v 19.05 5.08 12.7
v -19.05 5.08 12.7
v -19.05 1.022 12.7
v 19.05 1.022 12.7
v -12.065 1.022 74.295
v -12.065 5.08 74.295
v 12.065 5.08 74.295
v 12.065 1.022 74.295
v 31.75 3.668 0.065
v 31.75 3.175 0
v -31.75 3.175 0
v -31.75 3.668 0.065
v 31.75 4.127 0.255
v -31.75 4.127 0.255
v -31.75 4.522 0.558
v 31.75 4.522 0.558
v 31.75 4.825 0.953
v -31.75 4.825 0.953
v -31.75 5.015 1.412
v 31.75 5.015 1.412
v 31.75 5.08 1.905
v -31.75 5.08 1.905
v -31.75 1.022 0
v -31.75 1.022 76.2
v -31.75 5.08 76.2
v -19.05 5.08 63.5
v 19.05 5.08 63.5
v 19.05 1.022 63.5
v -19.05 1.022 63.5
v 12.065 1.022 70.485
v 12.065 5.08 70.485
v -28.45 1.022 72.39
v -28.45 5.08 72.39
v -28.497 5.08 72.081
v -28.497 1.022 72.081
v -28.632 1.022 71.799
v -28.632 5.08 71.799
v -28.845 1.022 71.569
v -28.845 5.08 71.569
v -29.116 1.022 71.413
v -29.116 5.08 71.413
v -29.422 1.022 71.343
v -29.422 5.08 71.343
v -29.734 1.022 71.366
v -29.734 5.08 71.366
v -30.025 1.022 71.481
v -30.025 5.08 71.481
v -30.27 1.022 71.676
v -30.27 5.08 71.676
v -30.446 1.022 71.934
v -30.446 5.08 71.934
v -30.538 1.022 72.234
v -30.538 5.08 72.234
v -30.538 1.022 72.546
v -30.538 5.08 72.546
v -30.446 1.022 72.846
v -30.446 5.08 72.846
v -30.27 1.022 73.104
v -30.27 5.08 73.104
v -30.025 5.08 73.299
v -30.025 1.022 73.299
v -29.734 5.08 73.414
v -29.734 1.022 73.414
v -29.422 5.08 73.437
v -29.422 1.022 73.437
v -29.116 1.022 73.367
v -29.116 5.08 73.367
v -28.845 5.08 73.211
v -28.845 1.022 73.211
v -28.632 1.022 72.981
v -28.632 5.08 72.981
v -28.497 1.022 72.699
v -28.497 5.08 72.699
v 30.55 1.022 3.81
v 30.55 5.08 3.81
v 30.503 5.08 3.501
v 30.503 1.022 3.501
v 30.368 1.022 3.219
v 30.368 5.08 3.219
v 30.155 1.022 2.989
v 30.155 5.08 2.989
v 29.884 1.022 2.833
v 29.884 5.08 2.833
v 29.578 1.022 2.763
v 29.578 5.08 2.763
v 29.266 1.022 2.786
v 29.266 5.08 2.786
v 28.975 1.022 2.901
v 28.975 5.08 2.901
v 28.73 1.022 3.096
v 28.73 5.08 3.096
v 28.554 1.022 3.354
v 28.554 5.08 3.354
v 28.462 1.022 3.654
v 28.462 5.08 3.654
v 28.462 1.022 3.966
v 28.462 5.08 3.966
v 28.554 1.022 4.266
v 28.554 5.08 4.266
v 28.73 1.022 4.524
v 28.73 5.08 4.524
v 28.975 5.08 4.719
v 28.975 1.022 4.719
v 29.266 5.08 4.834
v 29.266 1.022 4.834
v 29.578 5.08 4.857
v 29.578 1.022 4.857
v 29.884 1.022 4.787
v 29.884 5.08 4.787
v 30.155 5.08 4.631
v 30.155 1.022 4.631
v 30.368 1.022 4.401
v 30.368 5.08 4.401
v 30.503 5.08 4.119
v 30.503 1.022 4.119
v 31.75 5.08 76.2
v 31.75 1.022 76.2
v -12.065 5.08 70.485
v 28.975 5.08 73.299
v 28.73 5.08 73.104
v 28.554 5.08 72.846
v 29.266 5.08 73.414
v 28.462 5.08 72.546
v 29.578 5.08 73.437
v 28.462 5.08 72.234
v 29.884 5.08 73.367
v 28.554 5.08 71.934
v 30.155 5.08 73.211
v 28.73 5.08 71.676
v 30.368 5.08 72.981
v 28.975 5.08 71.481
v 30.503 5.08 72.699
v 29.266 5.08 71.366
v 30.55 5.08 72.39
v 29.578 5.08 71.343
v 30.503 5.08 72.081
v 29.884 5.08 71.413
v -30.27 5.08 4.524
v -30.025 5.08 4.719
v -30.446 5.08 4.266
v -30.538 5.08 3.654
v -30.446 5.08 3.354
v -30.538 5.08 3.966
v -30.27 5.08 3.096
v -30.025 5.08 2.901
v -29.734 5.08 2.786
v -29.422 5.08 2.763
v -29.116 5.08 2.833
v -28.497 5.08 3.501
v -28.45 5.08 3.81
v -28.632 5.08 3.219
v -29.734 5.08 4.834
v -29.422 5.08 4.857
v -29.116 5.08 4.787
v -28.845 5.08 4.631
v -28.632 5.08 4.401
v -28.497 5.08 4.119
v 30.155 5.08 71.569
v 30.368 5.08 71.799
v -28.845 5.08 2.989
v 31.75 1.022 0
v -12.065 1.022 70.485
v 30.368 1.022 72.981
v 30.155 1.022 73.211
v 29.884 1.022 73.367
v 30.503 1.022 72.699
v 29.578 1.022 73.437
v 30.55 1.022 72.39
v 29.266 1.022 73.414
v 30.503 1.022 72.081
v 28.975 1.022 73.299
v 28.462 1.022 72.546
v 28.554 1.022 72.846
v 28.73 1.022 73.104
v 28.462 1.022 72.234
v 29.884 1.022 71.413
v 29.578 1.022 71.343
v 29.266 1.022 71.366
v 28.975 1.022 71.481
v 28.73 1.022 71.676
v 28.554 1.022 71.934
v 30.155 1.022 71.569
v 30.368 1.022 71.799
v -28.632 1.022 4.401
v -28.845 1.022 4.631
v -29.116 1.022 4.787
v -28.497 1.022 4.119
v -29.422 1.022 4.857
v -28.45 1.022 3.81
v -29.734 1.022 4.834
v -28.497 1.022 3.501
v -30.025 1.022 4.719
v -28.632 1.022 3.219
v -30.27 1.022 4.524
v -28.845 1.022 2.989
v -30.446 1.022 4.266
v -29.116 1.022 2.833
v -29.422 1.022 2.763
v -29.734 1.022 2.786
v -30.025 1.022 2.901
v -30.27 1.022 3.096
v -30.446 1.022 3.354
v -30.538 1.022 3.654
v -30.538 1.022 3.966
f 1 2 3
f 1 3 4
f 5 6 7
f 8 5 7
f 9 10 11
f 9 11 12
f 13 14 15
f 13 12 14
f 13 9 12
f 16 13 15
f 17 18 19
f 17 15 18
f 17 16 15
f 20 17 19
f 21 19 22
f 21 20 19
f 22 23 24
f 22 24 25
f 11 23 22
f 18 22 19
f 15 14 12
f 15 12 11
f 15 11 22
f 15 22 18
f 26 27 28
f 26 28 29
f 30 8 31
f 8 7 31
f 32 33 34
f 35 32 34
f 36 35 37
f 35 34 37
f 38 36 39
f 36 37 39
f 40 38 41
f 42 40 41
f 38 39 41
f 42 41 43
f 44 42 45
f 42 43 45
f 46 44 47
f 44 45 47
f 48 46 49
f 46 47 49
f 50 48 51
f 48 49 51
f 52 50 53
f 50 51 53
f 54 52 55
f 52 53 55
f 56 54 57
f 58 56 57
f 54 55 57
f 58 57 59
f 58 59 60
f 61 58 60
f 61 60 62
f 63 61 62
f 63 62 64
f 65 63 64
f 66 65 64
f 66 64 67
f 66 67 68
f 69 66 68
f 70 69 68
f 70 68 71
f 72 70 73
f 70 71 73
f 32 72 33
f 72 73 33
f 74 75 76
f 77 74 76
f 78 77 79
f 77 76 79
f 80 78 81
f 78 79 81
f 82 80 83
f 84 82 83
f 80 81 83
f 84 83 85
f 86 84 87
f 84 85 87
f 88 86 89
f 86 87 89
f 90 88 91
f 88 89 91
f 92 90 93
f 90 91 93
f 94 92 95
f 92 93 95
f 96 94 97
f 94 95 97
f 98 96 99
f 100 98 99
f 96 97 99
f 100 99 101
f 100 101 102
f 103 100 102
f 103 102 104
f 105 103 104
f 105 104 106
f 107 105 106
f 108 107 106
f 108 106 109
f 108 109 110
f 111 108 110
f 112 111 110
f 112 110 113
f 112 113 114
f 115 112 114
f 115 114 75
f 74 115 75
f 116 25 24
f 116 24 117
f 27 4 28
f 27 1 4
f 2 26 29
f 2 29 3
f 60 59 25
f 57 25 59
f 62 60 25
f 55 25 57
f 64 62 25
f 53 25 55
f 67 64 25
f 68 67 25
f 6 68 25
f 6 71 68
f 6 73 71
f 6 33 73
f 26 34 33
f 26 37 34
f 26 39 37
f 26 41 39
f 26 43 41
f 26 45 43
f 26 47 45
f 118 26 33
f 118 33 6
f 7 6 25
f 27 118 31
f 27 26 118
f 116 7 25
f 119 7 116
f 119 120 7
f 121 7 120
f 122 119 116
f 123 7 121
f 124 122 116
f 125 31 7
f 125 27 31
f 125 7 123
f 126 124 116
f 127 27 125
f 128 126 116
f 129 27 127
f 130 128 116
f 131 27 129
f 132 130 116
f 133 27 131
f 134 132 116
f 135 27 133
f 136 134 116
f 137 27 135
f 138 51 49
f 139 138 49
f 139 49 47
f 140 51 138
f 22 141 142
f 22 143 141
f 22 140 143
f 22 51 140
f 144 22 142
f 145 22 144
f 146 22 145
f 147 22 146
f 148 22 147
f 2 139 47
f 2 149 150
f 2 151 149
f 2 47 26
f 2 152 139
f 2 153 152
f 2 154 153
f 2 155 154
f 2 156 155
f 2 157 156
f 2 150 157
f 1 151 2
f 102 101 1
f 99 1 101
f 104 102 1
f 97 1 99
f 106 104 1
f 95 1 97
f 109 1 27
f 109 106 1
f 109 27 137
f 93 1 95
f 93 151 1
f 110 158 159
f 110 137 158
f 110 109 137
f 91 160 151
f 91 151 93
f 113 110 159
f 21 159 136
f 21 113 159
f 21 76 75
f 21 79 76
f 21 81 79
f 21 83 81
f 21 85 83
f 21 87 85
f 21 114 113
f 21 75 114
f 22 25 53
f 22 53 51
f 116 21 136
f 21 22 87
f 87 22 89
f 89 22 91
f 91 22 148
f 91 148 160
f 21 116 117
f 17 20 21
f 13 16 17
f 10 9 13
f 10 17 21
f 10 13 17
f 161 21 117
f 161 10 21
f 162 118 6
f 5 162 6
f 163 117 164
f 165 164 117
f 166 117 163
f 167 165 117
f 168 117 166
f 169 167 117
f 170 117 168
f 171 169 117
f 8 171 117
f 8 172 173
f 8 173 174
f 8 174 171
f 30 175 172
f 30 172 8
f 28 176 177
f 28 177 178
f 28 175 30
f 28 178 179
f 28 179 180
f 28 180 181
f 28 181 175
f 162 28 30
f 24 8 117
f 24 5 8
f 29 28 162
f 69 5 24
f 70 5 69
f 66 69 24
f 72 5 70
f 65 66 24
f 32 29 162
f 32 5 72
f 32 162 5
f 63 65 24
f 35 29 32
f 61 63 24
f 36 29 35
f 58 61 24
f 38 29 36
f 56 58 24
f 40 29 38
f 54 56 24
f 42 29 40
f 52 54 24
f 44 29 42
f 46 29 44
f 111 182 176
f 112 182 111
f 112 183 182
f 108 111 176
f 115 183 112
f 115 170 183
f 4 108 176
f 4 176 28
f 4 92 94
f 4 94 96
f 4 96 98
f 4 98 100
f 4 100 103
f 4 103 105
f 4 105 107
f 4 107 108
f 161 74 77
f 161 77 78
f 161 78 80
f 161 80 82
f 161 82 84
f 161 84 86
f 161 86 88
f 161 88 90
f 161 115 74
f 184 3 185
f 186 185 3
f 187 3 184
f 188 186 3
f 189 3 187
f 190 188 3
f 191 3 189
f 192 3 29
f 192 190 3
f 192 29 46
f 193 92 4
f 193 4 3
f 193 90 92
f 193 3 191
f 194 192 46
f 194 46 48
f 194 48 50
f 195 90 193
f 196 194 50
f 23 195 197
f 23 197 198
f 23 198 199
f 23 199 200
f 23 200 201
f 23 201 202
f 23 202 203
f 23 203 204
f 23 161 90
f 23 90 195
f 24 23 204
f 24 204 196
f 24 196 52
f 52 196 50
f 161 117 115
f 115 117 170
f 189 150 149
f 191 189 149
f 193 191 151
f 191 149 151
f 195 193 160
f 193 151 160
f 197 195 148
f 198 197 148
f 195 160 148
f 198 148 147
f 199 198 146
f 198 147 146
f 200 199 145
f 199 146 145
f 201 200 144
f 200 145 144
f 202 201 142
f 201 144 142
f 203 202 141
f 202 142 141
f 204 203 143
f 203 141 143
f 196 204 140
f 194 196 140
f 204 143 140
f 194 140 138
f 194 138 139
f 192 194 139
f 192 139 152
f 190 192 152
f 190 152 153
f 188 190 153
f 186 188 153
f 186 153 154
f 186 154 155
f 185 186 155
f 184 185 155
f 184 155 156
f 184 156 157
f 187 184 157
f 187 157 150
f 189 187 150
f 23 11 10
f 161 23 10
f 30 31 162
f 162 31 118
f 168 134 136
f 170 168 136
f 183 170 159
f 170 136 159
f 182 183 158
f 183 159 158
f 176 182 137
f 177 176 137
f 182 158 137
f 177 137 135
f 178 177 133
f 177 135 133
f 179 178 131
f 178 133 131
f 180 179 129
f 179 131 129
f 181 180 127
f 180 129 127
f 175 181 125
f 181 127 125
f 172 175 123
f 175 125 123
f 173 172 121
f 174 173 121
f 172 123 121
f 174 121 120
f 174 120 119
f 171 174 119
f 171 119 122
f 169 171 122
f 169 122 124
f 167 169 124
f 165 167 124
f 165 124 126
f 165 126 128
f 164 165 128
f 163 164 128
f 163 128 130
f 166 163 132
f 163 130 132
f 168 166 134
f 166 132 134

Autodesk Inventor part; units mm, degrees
ref_plane "YZ Plane" through (0, 0, 0) normal (1, 0, 0) x (0, 1, 0)
ref_plane "XZ Plane" through (0, 0, 0) normal (0, 1, 0) x (-1, 0, 0)
ref_plane "XY Plane" through (0, 0, 0) normal (0, 0, 1) x (1, 0, 0)
sketch "Sketch1" plane through (0, 0, 0) normal (0, 0, 1) x (1, 0, 0)
  line L0 (-31.75, 5.08) -> (31.75, 5.08)
  line L1 (31.75, 5.08) -> (31.75, -5.08)
  line L2 (31.75, -5.08) -> (-31.75, -5.08)
  line L3 (-31.75, -5.08) -> (-31.75, 5.08)
  point P0 (0, 0)
  dimension "d0" = 63.5
  dimension "d3" = 31.75
  dimension "d4" = 10.16
  dimension "d17" = 5.08
extrude "Extrusion1" add sketch "Sketch1" along normal blind 76.2
sketch "Sketch3" plane through (0, 0, 76.2) normal (0, 0, 1) x (1, 0, 0)
  line L0 (-27.25, 0.3875) -> (27.25, 0.3875)
  line L1 (27.25, 0.3875) -> (27.25, -0.3745)
  line L2 (27.25, -0.3745) -> (-27.25, -0.3745)
  line L3 (-27.25, -0.3745) -> (-27.25, 0.3875)
  line L4 (-31.75, 5.08) -> (-31.75, -5.08) projected
  point P0 (0, 0)
  point P1 (-27.25, 0.0065)
  dimension "d6" = 0.762
  dimension "d7" = 54.5
  dimension "d8" = 4.5
extrude "Extrusion2" cut sketch "Sketch3" against normal blind 85.1
sketch "Sketch8" plane through (0, 0, 76.2) normal (0, 0, 1) x (1, 0, 0)
  line L0 (-31.75, 5.08) -> (-31.75, -5.08) projected
  line L1 (31.75, -5.08) -> (31.75, 5.08) projected
  line L2 (-31.75, -5.08) -> (31.75, -5.08)
  line L3 (31.75, -5.08) -> (31.75, 0.3875)
  line L4 (31.75, 0.3875) -> (-31.75, 0.3875)
  line L5 (-31.75, 0.3875) -> (-31.75, -5.08)
  line L6 (-27.25, 0.3875) -> (27.25, 0.3875) projected
  point P0 (0, 0)
  point P1 (-31.75, 0.3875)
  dimension "d30" = 0
extrude "Extrusion6" cut sketch "Sketch8" against normal blind 76.2
sketch "Sketch9" plane through (-31.75, 5.08, 0) normal (0, 1, 0) x (1, 0, 0)
  line L0 (63.5, 0) -> (0, 0) projected
  line L1 (0, 0) -> (0, -76.2) projected
  line L2 (63.5, -76.2) -> (0, -76.2) projected
  line L3 (63.5, 0) -> (63.5, -76.2) projected
  line L4 (12.7, -12.7) -> (50.8, -12.7)
  line L5 (50.8, -12.7) -> (50.8, -63.5)
  line L6 (50.8, -63.5) -> (12.7, -63.5)
  line L7 (12.7, -63.5) -> (12.7, -12.7)
  point P0 (31.75, 0)
  dimension "d33" = 12.7
extrude "Extrusion7" cut sketch "Sketch9" against normal blind 25.4 contours L4 L5 L6 L7
sketch "Sketch11" plane through (-31.75, 5.08, 0) normal (0, 1, 0) x (1, 0, 0)
  circle A0 centre (61.25, -72.39) radius 1.05
  line L0 (59, -76.2) -> (63.5, -76.2)
  line L1 (59, 0) -> (59, -76.2)
  circle A1 centre (2.25, -72.39) radius 1.05
  line L2 (0, 0) -> (0, -76.2)
  line L3 (0, -76.2) -> (4.5, -76.2)
  circle A2 centre (2.25, -3.81) radius 1.05
  circle A3 centre (61.25, -3.81) radius 1.05
  line L4 (4.5, 0) -> (0, 0)
  line L5 (63.5, 0) -> (59, 0)
  line L6 (50.8, -12.7) -> (50.8, -63.5) projected
  line L7 (50.8, -63.5) -> (12.7, -63.5) projected
  line L8 (12.7, -63.5) -> (12.7, -12.7) projected
  line L9 (12.7, -12.7) -> (50.8, -12.7) projected
  line L10 (63.5, 0) -> (0, 0) projected
  line L11 (0, 0) -> (0, -76.2) projected
  line L12 (63.5, -76.2) -> (0, -76.2) projected
  line L13 (63.5, 0) -> (63.5, -76.2) projected
  point P0 (31.75, -76.2)
  dimension "d37" = 2.1
  dimension "d38" = 3.81
  dimension "d39" = 2.25
  dimension "d40" = 2.25
  dimension "d41" = 2.1
  dimension "d42" = 3.81
  dimension "d43" = 2.1
  dimension "d44" = 2.1
  dimension "d45" = 3.81
  dimension "d46" = 3.81
  dimension "d47" = 2.25
  dimension "d48" = 2.25
extrude "Extrusion8" cut sketch "Sketch11" against normal blind 25.4 contours A0 | A1 | A2 | A3
fillet "Fillet1" radius 1.905 1 edges at (0, 5.08, 0)
sketch "Sketch13" plane through (-31.75, 5.08, 76.2) normal (0, 1, 0) x (1, 0, 0)
  point P0 (31.75, 76.2)
sketch "Sketch14" plane through (-31.75, 5.08, 76.2) normal (0, 1, 0) x (1, 0, 0)
  line L0 (19.685, 1.905) -> (43.815, 1.905)
  line L1 (43.815, 1.905) -> (43.815, 5.715)
  line L2 (43.815, 5.715) -> (19.685, 5.715)
  line L3 (19.685, 5.715) -> (19.685, 1.905)
  line L4 (63.5, 76.2) -> (0, 76.2) projected
  line L5 (0, 74.295) -> (0, 0) projected
  line L6 (63.5, 74.295) -> (63.5, 0) projected
  line L7 (63.5, 0) -> (0, 0) projected
  point P0 (31.75, 76.2)
  dimension "d54" = 1.905
  dimension "d55" = 3.81
  dimension "d61" = 24.13
  dimension "d62" = 63.5
  dimension "d63" = 19.685
extrude "Extrusion9" cut sketch "Sketch14" against normal blind 25.4
sketch "Sketch15" plane through (0, 0, 0) normal (0, 0, -1) x (-1, 0, 0)
  line L0 (31.75, 0.3875) -> (-31.75, 0.3875) projected
  line L1 (-31.75, 0.3875) -> (-31.75, 5.08) projected
  line L2 (31.75, 0.3875) -> (-31.75, 0.3875)
  line L3 (-31.75, 0.3875) -> (-31.75, 1.0225)
  line L4 (-31.75, 1.0225) -> (31.75, 1.0225)
  line L5 (31.75, 1.0225) -> (31.75, 0.3875)
  point P0 (0, 0)
  dimension "d58" = 0.635
extrude "Extrusion10" cut sketch "Sketch15" against normal blind 76.2
properties part number "Scanner_Test_Bot"
